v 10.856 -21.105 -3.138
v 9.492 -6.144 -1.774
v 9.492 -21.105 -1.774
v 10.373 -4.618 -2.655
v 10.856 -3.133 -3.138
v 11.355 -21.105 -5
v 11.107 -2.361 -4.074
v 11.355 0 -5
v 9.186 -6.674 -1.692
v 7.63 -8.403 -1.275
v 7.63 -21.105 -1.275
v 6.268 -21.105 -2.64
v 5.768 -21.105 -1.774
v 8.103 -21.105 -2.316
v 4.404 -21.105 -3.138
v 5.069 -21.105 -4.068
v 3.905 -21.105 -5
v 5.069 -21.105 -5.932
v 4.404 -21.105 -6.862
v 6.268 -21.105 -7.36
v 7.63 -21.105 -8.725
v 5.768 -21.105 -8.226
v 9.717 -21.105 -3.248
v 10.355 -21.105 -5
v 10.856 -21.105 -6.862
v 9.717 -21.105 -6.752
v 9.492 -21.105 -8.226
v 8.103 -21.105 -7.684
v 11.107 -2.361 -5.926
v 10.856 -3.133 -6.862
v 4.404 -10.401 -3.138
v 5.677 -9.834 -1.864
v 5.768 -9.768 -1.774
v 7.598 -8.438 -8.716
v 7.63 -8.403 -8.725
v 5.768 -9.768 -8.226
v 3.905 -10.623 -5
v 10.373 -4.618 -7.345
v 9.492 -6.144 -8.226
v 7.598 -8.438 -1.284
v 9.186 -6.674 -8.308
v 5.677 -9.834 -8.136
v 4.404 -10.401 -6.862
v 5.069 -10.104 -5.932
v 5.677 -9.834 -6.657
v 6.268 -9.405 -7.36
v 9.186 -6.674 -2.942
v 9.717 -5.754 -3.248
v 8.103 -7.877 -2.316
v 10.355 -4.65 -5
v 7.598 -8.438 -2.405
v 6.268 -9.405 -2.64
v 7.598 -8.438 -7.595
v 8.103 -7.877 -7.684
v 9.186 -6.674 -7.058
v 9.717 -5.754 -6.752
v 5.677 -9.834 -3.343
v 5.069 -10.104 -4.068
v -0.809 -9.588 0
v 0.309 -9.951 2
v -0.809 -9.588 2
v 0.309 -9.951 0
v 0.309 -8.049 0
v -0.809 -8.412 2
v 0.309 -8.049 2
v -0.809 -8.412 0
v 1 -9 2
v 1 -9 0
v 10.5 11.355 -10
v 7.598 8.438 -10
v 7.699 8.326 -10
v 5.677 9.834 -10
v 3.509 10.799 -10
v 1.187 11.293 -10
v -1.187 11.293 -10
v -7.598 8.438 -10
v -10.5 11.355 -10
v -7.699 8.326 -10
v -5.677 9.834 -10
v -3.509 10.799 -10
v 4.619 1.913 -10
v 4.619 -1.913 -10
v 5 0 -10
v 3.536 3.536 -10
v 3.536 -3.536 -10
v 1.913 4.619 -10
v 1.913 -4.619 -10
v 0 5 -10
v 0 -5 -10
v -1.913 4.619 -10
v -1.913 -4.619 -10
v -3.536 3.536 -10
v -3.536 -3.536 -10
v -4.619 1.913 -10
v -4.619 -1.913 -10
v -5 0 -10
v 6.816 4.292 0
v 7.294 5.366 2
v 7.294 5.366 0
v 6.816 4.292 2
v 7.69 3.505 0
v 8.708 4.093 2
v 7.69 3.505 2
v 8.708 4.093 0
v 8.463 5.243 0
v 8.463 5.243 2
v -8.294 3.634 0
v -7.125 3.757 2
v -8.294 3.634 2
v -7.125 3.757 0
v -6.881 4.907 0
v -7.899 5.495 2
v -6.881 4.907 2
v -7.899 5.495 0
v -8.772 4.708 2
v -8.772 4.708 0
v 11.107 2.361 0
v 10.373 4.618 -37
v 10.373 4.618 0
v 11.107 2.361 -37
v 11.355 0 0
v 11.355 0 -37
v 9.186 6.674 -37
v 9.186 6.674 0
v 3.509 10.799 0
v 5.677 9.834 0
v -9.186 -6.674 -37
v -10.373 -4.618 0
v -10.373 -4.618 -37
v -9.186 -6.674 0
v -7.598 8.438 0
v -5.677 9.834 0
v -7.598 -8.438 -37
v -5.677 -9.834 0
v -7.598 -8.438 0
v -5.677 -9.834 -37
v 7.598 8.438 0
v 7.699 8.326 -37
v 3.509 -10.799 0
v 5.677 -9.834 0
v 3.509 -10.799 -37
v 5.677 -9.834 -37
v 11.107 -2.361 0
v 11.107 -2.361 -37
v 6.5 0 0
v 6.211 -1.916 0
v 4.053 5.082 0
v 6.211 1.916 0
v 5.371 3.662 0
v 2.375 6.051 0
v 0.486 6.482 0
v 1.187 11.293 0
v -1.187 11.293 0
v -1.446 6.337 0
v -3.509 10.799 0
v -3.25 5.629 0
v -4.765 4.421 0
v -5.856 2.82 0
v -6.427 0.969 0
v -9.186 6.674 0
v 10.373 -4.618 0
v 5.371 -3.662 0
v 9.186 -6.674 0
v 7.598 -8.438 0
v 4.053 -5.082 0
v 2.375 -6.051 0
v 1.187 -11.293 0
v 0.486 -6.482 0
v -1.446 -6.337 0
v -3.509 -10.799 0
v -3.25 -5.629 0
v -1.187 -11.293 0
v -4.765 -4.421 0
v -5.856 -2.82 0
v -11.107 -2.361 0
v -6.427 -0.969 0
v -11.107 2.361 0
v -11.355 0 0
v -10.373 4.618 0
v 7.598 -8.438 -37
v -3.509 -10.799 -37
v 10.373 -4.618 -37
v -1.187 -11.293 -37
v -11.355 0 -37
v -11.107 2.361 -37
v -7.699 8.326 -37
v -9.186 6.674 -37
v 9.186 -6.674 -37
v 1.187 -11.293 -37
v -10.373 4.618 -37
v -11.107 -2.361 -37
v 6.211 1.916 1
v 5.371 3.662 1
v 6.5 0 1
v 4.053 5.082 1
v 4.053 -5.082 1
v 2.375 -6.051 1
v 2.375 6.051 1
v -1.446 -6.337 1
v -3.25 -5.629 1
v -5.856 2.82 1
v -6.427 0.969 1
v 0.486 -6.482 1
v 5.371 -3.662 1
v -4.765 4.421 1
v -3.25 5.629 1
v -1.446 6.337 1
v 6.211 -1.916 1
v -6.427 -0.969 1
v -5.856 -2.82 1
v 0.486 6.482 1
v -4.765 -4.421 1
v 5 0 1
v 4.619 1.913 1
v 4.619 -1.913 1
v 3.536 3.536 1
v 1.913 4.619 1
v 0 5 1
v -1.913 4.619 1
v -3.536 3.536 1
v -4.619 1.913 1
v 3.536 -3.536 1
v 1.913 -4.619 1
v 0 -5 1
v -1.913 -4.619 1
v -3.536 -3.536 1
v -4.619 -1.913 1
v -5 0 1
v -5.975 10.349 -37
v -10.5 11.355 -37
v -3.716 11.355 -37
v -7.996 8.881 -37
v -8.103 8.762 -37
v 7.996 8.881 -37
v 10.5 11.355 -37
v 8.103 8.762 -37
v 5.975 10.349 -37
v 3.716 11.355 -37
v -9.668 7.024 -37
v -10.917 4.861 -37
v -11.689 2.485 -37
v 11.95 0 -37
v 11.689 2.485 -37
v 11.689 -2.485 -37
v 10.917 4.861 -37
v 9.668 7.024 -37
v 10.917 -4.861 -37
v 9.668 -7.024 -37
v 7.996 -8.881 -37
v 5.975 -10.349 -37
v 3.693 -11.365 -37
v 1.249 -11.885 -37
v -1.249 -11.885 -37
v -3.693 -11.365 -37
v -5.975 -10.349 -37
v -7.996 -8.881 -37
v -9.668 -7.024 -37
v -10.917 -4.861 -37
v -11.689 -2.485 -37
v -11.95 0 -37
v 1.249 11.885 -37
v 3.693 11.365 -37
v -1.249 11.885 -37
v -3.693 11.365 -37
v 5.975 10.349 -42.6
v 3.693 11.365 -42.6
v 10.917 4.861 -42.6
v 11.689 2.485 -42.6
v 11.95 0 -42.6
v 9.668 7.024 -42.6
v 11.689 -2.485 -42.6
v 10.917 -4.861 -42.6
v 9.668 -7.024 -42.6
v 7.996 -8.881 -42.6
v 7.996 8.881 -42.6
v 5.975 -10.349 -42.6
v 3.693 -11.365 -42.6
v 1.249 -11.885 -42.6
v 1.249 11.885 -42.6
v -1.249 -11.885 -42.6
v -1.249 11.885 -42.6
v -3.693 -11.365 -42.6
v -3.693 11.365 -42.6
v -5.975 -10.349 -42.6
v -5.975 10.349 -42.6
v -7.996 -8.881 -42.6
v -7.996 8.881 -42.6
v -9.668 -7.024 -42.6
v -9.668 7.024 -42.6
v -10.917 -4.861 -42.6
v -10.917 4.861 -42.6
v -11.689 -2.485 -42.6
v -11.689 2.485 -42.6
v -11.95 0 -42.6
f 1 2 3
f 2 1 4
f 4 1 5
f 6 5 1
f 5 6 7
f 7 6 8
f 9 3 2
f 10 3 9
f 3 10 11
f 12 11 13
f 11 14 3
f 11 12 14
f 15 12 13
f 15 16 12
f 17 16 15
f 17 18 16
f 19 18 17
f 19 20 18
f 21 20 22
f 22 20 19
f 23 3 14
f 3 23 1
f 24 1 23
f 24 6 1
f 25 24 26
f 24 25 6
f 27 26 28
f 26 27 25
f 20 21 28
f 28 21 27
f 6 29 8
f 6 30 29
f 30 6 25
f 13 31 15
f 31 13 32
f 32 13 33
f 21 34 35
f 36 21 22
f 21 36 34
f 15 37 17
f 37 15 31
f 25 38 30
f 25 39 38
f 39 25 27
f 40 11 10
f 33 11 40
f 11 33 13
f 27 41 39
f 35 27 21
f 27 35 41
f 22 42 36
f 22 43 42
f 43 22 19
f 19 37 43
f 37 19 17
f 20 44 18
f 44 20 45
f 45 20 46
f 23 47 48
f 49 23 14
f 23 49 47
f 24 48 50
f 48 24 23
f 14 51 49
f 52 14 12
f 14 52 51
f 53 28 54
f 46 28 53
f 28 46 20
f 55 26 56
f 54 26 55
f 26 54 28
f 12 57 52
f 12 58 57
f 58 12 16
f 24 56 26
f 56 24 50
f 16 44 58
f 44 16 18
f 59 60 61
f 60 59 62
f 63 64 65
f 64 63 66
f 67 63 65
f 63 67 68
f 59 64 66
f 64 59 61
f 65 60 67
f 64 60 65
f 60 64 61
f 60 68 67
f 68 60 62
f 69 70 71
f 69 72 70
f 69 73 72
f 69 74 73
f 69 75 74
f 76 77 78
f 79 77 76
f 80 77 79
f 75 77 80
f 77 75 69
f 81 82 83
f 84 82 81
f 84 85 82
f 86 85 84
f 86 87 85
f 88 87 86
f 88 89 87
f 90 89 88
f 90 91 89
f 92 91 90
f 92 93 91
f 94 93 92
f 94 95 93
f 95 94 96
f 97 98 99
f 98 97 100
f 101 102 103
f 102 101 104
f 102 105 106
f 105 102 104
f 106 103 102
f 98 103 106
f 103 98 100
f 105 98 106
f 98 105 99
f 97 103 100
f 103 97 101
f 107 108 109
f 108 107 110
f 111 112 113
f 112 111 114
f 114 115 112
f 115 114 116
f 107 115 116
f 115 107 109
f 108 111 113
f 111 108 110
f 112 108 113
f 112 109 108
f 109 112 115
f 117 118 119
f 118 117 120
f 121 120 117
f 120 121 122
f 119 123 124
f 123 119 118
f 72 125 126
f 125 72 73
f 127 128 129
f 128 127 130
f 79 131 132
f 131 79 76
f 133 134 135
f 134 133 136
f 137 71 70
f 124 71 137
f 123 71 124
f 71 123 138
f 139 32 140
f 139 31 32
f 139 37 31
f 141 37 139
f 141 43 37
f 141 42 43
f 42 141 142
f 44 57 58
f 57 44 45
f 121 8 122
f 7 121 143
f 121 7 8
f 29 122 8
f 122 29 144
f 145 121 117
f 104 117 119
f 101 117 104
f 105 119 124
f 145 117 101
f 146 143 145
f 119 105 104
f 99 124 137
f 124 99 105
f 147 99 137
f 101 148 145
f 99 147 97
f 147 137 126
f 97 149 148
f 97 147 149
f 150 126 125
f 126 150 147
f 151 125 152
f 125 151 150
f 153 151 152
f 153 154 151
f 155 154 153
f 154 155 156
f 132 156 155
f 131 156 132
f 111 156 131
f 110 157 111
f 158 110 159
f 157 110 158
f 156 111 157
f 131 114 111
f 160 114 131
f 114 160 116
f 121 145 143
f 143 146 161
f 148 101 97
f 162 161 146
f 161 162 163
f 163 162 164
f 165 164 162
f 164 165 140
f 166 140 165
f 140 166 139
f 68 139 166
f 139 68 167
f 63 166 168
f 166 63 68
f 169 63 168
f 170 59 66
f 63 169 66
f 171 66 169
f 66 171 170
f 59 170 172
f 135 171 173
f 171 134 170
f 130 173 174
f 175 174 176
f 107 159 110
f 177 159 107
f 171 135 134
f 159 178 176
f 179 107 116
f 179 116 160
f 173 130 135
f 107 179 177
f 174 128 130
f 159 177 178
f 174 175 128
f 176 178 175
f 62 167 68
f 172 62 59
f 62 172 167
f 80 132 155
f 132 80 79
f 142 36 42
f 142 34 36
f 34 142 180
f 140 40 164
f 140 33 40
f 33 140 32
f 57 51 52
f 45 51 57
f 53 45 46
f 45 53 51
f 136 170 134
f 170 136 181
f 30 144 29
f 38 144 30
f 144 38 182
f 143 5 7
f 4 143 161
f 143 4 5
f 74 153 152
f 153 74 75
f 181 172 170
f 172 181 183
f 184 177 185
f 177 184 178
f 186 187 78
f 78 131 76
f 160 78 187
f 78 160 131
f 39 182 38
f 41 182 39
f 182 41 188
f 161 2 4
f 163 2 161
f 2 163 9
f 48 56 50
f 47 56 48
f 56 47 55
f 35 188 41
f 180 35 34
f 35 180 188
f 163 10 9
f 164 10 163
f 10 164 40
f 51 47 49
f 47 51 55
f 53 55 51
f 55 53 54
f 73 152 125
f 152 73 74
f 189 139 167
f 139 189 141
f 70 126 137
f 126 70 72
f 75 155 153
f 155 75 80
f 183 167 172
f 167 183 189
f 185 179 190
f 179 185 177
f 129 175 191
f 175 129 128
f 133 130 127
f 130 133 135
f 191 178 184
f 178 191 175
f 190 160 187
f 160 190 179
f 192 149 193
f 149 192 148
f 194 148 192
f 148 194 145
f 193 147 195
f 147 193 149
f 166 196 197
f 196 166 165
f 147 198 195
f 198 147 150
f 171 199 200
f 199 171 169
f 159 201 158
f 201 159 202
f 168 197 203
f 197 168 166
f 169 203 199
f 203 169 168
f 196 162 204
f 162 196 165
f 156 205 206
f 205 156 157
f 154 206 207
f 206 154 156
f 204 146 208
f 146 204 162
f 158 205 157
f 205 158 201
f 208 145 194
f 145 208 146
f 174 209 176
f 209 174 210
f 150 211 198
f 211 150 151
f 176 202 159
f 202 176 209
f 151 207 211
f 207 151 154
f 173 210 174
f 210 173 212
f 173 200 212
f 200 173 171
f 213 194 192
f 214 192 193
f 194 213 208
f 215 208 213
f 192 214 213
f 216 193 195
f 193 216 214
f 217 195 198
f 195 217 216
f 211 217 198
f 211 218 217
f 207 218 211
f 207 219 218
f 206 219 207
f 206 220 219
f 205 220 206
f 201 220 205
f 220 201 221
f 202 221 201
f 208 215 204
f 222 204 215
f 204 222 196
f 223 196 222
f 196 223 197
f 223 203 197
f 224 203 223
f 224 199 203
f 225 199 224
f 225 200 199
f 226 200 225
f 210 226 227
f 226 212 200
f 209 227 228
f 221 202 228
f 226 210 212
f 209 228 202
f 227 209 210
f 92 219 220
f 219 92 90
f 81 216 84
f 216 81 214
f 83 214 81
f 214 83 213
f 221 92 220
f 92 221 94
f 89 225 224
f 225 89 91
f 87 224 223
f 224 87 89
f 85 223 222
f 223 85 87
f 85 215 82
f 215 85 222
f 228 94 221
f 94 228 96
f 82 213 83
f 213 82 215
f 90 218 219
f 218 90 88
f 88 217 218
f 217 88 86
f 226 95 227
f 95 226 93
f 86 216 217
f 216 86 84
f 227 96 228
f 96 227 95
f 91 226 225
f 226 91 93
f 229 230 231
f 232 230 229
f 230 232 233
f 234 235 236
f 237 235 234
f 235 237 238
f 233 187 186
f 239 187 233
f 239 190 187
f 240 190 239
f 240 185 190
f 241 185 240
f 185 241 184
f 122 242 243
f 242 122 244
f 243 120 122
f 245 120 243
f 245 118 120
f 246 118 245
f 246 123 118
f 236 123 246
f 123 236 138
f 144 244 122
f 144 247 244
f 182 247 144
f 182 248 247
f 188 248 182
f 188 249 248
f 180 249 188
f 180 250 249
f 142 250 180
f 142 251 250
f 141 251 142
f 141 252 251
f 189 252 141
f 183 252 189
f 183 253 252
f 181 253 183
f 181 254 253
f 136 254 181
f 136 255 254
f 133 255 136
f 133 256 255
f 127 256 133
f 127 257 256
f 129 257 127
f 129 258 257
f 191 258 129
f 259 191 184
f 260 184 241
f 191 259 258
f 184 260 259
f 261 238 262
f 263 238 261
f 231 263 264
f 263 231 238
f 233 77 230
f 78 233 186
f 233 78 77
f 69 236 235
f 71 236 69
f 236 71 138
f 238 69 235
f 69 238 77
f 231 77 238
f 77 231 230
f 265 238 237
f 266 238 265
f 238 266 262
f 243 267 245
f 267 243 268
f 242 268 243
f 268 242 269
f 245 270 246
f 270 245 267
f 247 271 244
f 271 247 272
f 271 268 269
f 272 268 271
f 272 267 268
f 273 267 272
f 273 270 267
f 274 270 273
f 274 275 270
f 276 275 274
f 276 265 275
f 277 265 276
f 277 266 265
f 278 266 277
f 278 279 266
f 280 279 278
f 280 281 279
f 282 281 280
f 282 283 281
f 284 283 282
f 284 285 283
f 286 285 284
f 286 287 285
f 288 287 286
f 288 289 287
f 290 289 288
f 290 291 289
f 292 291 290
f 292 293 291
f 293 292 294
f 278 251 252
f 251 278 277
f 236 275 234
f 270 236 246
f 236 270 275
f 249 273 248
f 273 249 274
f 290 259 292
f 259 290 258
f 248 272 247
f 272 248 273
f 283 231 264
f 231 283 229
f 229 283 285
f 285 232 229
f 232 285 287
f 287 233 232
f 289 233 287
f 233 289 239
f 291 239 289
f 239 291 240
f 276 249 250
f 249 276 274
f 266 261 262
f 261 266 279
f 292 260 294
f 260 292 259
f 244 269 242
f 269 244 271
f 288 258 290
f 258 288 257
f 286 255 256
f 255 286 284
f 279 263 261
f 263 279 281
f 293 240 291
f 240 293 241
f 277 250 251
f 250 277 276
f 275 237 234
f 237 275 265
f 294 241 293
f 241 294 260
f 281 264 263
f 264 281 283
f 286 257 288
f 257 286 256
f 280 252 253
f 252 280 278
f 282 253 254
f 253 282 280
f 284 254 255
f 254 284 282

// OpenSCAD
function pump_4547_pump_diameter() = 22.71;
function pump_4547_foot_width() = 21;

// Submersible 3V DC Water Pump - 1 Meter Vertical Type, Adafruit 4547
// https://www.adafruit.com/product/4547
// JT-DC3W-3
// The component body has three main parts:
// - pump: a 10mm long housing with a fan attached to the motor shaft. The pump has a port meant to attach a hose
// - motor: a 27mm long housing containing a DC motor. The motor has a foot meant to slide into a slot for mounting
// - end: a short section covering the electrical connection on the back of the motor
module pump_4547() {
    pump_length=10;
    intake_diameter=10;
    lip_height=1;
    lip_diameter=13;
    alignment_offset=9;
    alignment_diameter=2;
    alignment_height=2;
    port_diameter=7.45;
    port_inner_diameter=port_diameter-2;
    port_height=9.75;
    motor_diameter=22.71;
    motor_length=27;
    end_length=42.6-motor_length-pump_length;
    end_diameter=23.9;

    translate([0,0,-pump_length]) union() {
        // pump
        difference() {
            union() {
                // pump body
                cylinder(h=pump_length, d=pump_4547_pump_diameter());
                
                // pump port
                translate([pump_4547_pump_diameter()/2-port_diameter/2,0,pump_length/2]) rotate([90,0,0]) difference() {
                    cylinder(h=port_height+pump_4547_pump_diameter()/2, d=port_diameter);
                    cylinder(h=port_height+pump_4547_pump_diameter()/2, d=port_inner_diameter);
                }
                
                // pump intake lip
                cylinder(h=pump_length+lip_height, d=lip_diameter);
                
                // alignment points
                for(t=[0:360/3:360]) rotate([0,0,t]) translate([0,-alignment_offset,0]) cylinder(h=pump_length+alignment_height, d=alignment_diameter);
            }
            
            // pump intake
            cylinder(h=pump_length+lip_height, d=intake_diameter);
        }
        
        // motor
        translate([0,0,-motor_length]) {
            cylinder(h=motor_length, d=motor_diameter);
            linear_extrude(motor_length) polygon([[-pump_4547_foot_width()/2,motor_diameter/2],[0,0],[pump_4547_foot_width()/2,motor_diameter/2]]);
        }

        // end
        translate([0,0,-end_length-motor_length]) {
            cylinder(h=end_length, d=end_diameter);
        }
    }
}

color("beige") pump_4547();
